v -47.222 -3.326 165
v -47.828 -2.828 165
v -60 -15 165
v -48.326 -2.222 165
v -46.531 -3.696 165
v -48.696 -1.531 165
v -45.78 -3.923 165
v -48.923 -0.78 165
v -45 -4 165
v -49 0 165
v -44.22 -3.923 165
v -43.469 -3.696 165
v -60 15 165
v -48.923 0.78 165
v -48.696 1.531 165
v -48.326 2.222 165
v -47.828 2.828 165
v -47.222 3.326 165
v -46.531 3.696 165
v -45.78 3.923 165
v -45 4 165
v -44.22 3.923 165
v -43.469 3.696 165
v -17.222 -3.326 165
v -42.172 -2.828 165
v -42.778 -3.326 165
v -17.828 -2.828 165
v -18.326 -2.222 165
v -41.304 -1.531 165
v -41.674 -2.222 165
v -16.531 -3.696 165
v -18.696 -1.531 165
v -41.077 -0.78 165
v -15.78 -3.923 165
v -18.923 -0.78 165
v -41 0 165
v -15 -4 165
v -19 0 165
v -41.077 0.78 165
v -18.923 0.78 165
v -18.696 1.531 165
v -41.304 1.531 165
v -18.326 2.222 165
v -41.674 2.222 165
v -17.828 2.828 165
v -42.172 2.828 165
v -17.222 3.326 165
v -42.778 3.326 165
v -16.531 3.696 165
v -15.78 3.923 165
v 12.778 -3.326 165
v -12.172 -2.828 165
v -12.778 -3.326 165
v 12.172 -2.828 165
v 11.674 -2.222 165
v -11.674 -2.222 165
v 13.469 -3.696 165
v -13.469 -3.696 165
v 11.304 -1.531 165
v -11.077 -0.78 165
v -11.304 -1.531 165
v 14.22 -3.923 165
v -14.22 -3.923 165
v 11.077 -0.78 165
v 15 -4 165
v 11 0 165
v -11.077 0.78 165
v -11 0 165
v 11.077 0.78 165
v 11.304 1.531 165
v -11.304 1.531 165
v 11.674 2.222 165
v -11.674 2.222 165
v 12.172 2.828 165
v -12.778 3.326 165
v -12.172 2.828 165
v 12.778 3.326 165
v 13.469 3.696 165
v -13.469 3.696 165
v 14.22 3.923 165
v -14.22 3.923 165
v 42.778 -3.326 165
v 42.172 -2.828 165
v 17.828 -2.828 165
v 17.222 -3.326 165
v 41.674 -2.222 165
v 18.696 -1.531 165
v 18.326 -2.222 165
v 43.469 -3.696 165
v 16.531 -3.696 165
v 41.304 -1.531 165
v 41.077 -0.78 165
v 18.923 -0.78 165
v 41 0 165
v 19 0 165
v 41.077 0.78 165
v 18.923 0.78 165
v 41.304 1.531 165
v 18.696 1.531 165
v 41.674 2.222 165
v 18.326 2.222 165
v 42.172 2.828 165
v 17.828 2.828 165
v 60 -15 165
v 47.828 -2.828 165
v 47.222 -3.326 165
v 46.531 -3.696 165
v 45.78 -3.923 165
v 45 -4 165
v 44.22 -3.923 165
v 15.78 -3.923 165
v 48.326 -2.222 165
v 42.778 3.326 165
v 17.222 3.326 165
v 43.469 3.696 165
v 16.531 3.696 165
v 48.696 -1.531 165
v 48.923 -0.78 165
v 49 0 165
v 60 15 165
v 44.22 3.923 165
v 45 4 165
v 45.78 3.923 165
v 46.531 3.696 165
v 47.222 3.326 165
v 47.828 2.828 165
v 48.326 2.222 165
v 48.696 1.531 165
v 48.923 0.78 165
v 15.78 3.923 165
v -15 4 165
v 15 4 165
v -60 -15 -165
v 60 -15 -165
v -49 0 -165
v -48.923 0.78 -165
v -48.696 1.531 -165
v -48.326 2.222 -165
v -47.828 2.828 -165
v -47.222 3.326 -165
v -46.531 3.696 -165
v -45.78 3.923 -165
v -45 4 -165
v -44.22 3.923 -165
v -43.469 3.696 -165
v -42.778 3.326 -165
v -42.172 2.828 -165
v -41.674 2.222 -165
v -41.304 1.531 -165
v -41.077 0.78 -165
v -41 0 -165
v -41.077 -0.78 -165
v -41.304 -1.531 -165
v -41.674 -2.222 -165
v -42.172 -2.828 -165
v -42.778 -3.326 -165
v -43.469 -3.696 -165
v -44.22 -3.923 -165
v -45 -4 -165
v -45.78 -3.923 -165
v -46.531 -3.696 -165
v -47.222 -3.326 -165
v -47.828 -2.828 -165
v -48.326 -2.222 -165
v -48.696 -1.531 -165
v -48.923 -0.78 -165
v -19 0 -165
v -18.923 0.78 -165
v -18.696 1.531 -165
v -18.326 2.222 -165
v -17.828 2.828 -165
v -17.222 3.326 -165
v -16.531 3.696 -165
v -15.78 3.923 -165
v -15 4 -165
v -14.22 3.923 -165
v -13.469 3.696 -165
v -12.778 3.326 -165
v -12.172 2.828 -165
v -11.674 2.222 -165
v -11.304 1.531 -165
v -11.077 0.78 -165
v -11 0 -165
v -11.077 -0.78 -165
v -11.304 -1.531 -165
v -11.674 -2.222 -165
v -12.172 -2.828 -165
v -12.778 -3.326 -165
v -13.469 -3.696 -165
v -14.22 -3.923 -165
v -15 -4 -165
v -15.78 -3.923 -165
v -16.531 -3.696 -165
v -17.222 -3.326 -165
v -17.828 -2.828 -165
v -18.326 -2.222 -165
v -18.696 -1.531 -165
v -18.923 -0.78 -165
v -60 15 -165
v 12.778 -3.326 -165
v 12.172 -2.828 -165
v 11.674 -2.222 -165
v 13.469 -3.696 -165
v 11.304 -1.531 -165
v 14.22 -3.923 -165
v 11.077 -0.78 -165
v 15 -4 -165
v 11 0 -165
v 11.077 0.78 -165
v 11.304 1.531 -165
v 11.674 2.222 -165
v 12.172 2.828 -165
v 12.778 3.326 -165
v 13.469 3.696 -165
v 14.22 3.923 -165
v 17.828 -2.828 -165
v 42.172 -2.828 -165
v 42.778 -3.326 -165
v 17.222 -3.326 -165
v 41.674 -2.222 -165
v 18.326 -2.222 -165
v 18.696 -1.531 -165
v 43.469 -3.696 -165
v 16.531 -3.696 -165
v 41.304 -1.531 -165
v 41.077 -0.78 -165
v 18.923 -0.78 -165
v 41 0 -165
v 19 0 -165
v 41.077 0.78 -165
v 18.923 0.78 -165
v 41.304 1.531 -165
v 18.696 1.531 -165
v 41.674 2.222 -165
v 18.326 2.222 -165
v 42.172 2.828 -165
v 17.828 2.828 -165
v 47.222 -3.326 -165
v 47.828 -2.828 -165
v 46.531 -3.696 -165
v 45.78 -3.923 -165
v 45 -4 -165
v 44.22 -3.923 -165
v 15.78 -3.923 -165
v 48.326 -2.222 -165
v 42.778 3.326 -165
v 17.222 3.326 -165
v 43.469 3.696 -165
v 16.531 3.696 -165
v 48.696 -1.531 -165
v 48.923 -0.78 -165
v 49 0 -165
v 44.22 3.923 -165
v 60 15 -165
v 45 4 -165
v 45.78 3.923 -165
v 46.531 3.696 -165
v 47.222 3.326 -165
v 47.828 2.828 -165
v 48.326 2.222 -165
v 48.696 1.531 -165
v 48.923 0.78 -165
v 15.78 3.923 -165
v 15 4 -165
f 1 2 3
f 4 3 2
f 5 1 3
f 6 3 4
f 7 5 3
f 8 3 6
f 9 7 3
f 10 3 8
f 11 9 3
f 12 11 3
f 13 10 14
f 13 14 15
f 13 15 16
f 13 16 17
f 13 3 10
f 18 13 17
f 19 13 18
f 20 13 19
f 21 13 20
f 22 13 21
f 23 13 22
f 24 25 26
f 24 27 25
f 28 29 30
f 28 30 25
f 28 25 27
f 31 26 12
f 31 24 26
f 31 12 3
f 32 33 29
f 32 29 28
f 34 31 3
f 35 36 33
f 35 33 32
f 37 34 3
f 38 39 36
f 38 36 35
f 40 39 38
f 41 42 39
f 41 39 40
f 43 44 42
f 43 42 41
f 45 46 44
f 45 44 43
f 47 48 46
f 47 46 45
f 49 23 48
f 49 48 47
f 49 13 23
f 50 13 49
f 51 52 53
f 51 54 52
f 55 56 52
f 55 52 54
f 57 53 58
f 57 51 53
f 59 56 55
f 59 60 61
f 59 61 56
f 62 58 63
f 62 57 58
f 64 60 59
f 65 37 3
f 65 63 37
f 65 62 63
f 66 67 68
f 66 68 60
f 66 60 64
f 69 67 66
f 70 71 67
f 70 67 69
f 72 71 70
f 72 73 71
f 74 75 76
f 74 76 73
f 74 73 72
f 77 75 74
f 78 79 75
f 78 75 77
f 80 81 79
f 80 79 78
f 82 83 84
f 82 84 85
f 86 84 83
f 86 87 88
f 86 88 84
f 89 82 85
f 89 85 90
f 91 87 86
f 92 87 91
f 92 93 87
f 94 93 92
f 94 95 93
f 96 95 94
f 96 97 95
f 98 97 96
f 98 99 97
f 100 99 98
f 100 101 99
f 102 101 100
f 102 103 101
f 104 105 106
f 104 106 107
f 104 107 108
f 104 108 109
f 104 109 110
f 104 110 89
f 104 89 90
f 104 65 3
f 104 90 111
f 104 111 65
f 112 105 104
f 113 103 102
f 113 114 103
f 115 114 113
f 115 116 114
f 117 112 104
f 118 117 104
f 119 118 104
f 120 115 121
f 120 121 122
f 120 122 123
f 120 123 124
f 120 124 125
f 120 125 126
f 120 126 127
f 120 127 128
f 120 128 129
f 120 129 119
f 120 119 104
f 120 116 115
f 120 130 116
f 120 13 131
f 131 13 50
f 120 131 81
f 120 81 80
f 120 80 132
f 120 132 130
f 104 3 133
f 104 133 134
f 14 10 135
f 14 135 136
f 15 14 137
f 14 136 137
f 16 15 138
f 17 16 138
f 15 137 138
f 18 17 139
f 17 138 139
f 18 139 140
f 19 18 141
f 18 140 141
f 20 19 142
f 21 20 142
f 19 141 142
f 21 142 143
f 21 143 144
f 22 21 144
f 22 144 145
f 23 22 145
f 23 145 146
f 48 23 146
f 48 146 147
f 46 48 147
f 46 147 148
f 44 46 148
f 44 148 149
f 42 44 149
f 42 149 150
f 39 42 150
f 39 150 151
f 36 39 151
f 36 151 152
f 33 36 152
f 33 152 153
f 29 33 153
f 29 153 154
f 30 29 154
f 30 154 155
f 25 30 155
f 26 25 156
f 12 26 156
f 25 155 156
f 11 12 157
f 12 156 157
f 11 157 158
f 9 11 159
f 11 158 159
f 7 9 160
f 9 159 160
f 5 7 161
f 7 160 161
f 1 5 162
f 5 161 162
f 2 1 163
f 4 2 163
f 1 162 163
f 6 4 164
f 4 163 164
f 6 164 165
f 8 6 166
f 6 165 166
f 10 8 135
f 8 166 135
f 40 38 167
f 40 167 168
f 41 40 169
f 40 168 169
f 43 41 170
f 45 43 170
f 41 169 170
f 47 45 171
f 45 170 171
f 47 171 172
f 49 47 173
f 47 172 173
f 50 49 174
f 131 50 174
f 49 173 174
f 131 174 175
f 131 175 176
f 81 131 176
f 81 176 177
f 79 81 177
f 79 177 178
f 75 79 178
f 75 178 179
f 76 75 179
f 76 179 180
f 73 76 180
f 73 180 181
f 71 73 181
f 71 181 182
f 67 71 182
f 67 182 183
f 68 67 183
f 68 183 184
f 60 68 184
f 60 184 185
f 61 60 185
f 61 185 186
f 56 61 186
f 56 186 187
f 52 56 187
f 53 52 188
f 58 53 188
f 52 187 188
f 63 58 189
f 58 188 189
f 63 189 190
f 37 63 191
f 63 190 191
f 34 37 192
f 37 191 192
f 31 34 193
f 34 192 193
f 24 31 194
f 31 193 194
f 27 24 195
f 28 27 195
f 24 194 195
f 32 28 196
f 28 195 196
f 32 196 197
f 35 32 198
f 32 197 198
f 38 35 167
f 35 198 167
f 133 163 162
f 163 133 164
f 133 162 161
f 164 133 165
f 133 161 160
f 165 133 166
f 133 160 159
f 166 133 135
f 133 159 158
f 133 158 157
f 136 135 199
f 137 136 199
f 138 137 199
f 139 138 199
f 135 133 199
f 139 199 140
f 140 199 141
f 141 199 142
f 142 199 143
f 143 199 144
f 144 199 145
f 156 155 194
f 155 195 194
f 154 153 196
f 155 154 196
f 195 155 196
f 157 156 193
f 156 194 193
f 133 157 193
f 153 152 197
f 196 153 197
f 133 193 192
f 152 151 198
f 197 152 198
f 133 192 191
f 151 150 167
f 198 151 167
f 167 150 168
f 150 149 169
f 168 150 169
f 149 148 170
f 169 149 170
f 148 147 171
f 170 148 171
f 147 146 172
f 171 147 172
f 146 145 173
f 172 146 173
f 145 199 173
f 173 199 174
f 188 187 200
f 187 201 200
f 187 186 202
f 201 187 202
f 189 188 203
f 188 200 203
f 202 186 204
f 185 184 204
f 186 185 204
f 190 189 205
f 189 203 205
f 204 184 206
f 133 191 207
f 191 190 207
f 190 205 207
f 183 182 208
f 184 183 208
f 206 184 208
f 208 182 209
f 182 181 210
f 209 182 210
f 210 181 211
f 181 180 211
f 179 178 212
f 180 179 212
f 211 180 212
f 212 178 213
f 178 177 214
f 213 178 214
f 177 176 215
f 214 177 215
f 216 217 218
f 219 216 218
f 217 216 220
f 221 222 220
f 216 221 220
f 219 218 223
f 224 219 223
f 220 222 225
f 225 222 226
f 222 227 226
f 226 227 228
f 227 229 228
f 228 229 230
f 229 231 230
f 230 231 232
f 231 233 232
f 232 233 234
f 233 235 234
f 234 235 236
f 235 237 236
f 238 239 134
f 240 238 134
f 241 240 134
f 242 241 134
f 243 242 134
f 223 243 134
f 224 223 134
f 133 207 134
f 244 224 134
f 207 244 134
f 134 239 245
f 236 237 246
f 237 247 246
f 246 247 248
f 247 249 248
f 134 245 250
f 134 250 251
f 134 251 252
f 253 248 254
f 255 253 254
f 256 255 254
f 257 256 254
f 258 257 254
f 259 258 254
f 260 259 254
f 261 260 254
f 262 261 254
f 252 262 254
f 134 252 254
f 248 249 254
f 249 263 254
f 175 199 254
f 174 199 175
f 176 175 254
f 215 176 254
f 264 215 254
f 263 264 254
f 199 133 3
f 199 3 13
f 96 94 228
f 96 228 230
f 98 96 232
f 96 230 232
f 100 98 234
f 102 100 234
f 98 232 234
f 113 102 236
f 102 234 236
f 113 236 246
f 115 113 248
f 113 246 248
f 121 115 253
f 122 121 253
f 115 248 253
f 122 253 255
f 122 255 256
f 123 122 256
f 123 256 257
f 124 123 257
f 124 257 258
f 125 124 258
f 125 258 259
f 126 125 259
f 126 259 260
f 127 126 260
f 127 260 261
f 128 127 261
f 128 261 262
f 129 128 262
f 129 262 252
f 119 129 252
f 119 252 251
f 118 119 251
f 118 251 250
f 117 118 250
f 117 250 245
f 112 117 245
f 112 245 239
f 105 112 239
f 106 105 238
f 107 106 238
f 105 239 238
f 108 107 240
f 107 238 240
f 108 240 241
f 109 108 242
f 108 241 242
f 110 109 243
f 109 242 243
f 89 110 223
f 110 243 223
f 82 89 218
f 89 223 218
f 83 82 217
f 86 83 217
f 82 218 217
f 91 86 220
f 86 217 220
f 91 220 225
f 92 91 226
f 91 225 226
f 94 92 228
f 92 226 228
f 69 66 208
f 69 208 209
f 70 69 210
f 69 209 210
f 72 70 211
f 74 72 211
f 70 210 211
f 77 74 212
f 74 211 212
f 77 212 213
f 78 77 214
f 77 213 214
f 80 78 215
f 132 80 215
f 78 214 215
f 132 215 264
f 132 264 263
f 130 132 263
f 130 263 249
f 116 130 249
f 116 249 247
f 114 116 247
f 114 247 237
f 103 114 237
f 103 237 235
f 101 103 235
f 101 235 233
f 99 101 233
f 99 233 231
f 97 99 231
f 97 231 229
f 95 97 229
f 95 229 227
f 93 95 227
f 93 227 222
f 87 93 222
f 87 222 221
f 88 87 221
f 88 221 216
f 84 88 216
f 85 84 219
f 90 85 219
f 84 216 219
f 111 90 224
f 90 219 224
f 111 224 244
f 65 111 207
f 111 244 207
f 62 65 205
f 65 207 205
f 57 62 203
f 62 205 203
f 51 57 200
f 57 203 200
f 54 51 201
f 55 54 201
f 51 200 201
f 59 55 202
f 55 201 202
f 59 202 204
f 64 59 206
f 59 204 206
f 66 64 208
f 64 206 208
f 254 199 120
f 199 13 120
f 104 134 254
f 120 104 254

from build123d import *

# Parameters (mm, degrees)
SKETCH1_W           = 120
SKETCH1_H           = 30
BOSS_EXTRUDE1_DEPTH = 165
SKETCH2_R           = 4
CUT_EXTRUDE1_DEPTH  = 331


with BuildPart() as part:
    # Sketch1 → Boss-Extrude1 (new body, symmetric)
    with BuildSketch(Plane.XY):
        Rectangle(SKETCH1_W, SKETCH1_H)
    extrude(amount=BOSS_EXTRUDE1_DEPTH, both=True)

    # Sketch2 → Cut-Extrude1 (cut, through all)
    with BuildSketch(Plane(origin=(0, 0, -165), x_dir=(-1, 0, 0), z_dir=(0, 0, -1))):
        with Locations((-45, 0)):
            Circle(SKETCH2_R)
        with Locations((-15, 0)):
            Circle(SKETCH2_R)
        with Locations((15, 0)):
            Circle(SKETCH2_R)
        with Locations((45, 0)):
            Circle(SKETCH2_R)
    extrude(amount=-CUT_EXTRUDE1_DEPTH, mode=Mode.SUBTRACT)


solid = part.part
